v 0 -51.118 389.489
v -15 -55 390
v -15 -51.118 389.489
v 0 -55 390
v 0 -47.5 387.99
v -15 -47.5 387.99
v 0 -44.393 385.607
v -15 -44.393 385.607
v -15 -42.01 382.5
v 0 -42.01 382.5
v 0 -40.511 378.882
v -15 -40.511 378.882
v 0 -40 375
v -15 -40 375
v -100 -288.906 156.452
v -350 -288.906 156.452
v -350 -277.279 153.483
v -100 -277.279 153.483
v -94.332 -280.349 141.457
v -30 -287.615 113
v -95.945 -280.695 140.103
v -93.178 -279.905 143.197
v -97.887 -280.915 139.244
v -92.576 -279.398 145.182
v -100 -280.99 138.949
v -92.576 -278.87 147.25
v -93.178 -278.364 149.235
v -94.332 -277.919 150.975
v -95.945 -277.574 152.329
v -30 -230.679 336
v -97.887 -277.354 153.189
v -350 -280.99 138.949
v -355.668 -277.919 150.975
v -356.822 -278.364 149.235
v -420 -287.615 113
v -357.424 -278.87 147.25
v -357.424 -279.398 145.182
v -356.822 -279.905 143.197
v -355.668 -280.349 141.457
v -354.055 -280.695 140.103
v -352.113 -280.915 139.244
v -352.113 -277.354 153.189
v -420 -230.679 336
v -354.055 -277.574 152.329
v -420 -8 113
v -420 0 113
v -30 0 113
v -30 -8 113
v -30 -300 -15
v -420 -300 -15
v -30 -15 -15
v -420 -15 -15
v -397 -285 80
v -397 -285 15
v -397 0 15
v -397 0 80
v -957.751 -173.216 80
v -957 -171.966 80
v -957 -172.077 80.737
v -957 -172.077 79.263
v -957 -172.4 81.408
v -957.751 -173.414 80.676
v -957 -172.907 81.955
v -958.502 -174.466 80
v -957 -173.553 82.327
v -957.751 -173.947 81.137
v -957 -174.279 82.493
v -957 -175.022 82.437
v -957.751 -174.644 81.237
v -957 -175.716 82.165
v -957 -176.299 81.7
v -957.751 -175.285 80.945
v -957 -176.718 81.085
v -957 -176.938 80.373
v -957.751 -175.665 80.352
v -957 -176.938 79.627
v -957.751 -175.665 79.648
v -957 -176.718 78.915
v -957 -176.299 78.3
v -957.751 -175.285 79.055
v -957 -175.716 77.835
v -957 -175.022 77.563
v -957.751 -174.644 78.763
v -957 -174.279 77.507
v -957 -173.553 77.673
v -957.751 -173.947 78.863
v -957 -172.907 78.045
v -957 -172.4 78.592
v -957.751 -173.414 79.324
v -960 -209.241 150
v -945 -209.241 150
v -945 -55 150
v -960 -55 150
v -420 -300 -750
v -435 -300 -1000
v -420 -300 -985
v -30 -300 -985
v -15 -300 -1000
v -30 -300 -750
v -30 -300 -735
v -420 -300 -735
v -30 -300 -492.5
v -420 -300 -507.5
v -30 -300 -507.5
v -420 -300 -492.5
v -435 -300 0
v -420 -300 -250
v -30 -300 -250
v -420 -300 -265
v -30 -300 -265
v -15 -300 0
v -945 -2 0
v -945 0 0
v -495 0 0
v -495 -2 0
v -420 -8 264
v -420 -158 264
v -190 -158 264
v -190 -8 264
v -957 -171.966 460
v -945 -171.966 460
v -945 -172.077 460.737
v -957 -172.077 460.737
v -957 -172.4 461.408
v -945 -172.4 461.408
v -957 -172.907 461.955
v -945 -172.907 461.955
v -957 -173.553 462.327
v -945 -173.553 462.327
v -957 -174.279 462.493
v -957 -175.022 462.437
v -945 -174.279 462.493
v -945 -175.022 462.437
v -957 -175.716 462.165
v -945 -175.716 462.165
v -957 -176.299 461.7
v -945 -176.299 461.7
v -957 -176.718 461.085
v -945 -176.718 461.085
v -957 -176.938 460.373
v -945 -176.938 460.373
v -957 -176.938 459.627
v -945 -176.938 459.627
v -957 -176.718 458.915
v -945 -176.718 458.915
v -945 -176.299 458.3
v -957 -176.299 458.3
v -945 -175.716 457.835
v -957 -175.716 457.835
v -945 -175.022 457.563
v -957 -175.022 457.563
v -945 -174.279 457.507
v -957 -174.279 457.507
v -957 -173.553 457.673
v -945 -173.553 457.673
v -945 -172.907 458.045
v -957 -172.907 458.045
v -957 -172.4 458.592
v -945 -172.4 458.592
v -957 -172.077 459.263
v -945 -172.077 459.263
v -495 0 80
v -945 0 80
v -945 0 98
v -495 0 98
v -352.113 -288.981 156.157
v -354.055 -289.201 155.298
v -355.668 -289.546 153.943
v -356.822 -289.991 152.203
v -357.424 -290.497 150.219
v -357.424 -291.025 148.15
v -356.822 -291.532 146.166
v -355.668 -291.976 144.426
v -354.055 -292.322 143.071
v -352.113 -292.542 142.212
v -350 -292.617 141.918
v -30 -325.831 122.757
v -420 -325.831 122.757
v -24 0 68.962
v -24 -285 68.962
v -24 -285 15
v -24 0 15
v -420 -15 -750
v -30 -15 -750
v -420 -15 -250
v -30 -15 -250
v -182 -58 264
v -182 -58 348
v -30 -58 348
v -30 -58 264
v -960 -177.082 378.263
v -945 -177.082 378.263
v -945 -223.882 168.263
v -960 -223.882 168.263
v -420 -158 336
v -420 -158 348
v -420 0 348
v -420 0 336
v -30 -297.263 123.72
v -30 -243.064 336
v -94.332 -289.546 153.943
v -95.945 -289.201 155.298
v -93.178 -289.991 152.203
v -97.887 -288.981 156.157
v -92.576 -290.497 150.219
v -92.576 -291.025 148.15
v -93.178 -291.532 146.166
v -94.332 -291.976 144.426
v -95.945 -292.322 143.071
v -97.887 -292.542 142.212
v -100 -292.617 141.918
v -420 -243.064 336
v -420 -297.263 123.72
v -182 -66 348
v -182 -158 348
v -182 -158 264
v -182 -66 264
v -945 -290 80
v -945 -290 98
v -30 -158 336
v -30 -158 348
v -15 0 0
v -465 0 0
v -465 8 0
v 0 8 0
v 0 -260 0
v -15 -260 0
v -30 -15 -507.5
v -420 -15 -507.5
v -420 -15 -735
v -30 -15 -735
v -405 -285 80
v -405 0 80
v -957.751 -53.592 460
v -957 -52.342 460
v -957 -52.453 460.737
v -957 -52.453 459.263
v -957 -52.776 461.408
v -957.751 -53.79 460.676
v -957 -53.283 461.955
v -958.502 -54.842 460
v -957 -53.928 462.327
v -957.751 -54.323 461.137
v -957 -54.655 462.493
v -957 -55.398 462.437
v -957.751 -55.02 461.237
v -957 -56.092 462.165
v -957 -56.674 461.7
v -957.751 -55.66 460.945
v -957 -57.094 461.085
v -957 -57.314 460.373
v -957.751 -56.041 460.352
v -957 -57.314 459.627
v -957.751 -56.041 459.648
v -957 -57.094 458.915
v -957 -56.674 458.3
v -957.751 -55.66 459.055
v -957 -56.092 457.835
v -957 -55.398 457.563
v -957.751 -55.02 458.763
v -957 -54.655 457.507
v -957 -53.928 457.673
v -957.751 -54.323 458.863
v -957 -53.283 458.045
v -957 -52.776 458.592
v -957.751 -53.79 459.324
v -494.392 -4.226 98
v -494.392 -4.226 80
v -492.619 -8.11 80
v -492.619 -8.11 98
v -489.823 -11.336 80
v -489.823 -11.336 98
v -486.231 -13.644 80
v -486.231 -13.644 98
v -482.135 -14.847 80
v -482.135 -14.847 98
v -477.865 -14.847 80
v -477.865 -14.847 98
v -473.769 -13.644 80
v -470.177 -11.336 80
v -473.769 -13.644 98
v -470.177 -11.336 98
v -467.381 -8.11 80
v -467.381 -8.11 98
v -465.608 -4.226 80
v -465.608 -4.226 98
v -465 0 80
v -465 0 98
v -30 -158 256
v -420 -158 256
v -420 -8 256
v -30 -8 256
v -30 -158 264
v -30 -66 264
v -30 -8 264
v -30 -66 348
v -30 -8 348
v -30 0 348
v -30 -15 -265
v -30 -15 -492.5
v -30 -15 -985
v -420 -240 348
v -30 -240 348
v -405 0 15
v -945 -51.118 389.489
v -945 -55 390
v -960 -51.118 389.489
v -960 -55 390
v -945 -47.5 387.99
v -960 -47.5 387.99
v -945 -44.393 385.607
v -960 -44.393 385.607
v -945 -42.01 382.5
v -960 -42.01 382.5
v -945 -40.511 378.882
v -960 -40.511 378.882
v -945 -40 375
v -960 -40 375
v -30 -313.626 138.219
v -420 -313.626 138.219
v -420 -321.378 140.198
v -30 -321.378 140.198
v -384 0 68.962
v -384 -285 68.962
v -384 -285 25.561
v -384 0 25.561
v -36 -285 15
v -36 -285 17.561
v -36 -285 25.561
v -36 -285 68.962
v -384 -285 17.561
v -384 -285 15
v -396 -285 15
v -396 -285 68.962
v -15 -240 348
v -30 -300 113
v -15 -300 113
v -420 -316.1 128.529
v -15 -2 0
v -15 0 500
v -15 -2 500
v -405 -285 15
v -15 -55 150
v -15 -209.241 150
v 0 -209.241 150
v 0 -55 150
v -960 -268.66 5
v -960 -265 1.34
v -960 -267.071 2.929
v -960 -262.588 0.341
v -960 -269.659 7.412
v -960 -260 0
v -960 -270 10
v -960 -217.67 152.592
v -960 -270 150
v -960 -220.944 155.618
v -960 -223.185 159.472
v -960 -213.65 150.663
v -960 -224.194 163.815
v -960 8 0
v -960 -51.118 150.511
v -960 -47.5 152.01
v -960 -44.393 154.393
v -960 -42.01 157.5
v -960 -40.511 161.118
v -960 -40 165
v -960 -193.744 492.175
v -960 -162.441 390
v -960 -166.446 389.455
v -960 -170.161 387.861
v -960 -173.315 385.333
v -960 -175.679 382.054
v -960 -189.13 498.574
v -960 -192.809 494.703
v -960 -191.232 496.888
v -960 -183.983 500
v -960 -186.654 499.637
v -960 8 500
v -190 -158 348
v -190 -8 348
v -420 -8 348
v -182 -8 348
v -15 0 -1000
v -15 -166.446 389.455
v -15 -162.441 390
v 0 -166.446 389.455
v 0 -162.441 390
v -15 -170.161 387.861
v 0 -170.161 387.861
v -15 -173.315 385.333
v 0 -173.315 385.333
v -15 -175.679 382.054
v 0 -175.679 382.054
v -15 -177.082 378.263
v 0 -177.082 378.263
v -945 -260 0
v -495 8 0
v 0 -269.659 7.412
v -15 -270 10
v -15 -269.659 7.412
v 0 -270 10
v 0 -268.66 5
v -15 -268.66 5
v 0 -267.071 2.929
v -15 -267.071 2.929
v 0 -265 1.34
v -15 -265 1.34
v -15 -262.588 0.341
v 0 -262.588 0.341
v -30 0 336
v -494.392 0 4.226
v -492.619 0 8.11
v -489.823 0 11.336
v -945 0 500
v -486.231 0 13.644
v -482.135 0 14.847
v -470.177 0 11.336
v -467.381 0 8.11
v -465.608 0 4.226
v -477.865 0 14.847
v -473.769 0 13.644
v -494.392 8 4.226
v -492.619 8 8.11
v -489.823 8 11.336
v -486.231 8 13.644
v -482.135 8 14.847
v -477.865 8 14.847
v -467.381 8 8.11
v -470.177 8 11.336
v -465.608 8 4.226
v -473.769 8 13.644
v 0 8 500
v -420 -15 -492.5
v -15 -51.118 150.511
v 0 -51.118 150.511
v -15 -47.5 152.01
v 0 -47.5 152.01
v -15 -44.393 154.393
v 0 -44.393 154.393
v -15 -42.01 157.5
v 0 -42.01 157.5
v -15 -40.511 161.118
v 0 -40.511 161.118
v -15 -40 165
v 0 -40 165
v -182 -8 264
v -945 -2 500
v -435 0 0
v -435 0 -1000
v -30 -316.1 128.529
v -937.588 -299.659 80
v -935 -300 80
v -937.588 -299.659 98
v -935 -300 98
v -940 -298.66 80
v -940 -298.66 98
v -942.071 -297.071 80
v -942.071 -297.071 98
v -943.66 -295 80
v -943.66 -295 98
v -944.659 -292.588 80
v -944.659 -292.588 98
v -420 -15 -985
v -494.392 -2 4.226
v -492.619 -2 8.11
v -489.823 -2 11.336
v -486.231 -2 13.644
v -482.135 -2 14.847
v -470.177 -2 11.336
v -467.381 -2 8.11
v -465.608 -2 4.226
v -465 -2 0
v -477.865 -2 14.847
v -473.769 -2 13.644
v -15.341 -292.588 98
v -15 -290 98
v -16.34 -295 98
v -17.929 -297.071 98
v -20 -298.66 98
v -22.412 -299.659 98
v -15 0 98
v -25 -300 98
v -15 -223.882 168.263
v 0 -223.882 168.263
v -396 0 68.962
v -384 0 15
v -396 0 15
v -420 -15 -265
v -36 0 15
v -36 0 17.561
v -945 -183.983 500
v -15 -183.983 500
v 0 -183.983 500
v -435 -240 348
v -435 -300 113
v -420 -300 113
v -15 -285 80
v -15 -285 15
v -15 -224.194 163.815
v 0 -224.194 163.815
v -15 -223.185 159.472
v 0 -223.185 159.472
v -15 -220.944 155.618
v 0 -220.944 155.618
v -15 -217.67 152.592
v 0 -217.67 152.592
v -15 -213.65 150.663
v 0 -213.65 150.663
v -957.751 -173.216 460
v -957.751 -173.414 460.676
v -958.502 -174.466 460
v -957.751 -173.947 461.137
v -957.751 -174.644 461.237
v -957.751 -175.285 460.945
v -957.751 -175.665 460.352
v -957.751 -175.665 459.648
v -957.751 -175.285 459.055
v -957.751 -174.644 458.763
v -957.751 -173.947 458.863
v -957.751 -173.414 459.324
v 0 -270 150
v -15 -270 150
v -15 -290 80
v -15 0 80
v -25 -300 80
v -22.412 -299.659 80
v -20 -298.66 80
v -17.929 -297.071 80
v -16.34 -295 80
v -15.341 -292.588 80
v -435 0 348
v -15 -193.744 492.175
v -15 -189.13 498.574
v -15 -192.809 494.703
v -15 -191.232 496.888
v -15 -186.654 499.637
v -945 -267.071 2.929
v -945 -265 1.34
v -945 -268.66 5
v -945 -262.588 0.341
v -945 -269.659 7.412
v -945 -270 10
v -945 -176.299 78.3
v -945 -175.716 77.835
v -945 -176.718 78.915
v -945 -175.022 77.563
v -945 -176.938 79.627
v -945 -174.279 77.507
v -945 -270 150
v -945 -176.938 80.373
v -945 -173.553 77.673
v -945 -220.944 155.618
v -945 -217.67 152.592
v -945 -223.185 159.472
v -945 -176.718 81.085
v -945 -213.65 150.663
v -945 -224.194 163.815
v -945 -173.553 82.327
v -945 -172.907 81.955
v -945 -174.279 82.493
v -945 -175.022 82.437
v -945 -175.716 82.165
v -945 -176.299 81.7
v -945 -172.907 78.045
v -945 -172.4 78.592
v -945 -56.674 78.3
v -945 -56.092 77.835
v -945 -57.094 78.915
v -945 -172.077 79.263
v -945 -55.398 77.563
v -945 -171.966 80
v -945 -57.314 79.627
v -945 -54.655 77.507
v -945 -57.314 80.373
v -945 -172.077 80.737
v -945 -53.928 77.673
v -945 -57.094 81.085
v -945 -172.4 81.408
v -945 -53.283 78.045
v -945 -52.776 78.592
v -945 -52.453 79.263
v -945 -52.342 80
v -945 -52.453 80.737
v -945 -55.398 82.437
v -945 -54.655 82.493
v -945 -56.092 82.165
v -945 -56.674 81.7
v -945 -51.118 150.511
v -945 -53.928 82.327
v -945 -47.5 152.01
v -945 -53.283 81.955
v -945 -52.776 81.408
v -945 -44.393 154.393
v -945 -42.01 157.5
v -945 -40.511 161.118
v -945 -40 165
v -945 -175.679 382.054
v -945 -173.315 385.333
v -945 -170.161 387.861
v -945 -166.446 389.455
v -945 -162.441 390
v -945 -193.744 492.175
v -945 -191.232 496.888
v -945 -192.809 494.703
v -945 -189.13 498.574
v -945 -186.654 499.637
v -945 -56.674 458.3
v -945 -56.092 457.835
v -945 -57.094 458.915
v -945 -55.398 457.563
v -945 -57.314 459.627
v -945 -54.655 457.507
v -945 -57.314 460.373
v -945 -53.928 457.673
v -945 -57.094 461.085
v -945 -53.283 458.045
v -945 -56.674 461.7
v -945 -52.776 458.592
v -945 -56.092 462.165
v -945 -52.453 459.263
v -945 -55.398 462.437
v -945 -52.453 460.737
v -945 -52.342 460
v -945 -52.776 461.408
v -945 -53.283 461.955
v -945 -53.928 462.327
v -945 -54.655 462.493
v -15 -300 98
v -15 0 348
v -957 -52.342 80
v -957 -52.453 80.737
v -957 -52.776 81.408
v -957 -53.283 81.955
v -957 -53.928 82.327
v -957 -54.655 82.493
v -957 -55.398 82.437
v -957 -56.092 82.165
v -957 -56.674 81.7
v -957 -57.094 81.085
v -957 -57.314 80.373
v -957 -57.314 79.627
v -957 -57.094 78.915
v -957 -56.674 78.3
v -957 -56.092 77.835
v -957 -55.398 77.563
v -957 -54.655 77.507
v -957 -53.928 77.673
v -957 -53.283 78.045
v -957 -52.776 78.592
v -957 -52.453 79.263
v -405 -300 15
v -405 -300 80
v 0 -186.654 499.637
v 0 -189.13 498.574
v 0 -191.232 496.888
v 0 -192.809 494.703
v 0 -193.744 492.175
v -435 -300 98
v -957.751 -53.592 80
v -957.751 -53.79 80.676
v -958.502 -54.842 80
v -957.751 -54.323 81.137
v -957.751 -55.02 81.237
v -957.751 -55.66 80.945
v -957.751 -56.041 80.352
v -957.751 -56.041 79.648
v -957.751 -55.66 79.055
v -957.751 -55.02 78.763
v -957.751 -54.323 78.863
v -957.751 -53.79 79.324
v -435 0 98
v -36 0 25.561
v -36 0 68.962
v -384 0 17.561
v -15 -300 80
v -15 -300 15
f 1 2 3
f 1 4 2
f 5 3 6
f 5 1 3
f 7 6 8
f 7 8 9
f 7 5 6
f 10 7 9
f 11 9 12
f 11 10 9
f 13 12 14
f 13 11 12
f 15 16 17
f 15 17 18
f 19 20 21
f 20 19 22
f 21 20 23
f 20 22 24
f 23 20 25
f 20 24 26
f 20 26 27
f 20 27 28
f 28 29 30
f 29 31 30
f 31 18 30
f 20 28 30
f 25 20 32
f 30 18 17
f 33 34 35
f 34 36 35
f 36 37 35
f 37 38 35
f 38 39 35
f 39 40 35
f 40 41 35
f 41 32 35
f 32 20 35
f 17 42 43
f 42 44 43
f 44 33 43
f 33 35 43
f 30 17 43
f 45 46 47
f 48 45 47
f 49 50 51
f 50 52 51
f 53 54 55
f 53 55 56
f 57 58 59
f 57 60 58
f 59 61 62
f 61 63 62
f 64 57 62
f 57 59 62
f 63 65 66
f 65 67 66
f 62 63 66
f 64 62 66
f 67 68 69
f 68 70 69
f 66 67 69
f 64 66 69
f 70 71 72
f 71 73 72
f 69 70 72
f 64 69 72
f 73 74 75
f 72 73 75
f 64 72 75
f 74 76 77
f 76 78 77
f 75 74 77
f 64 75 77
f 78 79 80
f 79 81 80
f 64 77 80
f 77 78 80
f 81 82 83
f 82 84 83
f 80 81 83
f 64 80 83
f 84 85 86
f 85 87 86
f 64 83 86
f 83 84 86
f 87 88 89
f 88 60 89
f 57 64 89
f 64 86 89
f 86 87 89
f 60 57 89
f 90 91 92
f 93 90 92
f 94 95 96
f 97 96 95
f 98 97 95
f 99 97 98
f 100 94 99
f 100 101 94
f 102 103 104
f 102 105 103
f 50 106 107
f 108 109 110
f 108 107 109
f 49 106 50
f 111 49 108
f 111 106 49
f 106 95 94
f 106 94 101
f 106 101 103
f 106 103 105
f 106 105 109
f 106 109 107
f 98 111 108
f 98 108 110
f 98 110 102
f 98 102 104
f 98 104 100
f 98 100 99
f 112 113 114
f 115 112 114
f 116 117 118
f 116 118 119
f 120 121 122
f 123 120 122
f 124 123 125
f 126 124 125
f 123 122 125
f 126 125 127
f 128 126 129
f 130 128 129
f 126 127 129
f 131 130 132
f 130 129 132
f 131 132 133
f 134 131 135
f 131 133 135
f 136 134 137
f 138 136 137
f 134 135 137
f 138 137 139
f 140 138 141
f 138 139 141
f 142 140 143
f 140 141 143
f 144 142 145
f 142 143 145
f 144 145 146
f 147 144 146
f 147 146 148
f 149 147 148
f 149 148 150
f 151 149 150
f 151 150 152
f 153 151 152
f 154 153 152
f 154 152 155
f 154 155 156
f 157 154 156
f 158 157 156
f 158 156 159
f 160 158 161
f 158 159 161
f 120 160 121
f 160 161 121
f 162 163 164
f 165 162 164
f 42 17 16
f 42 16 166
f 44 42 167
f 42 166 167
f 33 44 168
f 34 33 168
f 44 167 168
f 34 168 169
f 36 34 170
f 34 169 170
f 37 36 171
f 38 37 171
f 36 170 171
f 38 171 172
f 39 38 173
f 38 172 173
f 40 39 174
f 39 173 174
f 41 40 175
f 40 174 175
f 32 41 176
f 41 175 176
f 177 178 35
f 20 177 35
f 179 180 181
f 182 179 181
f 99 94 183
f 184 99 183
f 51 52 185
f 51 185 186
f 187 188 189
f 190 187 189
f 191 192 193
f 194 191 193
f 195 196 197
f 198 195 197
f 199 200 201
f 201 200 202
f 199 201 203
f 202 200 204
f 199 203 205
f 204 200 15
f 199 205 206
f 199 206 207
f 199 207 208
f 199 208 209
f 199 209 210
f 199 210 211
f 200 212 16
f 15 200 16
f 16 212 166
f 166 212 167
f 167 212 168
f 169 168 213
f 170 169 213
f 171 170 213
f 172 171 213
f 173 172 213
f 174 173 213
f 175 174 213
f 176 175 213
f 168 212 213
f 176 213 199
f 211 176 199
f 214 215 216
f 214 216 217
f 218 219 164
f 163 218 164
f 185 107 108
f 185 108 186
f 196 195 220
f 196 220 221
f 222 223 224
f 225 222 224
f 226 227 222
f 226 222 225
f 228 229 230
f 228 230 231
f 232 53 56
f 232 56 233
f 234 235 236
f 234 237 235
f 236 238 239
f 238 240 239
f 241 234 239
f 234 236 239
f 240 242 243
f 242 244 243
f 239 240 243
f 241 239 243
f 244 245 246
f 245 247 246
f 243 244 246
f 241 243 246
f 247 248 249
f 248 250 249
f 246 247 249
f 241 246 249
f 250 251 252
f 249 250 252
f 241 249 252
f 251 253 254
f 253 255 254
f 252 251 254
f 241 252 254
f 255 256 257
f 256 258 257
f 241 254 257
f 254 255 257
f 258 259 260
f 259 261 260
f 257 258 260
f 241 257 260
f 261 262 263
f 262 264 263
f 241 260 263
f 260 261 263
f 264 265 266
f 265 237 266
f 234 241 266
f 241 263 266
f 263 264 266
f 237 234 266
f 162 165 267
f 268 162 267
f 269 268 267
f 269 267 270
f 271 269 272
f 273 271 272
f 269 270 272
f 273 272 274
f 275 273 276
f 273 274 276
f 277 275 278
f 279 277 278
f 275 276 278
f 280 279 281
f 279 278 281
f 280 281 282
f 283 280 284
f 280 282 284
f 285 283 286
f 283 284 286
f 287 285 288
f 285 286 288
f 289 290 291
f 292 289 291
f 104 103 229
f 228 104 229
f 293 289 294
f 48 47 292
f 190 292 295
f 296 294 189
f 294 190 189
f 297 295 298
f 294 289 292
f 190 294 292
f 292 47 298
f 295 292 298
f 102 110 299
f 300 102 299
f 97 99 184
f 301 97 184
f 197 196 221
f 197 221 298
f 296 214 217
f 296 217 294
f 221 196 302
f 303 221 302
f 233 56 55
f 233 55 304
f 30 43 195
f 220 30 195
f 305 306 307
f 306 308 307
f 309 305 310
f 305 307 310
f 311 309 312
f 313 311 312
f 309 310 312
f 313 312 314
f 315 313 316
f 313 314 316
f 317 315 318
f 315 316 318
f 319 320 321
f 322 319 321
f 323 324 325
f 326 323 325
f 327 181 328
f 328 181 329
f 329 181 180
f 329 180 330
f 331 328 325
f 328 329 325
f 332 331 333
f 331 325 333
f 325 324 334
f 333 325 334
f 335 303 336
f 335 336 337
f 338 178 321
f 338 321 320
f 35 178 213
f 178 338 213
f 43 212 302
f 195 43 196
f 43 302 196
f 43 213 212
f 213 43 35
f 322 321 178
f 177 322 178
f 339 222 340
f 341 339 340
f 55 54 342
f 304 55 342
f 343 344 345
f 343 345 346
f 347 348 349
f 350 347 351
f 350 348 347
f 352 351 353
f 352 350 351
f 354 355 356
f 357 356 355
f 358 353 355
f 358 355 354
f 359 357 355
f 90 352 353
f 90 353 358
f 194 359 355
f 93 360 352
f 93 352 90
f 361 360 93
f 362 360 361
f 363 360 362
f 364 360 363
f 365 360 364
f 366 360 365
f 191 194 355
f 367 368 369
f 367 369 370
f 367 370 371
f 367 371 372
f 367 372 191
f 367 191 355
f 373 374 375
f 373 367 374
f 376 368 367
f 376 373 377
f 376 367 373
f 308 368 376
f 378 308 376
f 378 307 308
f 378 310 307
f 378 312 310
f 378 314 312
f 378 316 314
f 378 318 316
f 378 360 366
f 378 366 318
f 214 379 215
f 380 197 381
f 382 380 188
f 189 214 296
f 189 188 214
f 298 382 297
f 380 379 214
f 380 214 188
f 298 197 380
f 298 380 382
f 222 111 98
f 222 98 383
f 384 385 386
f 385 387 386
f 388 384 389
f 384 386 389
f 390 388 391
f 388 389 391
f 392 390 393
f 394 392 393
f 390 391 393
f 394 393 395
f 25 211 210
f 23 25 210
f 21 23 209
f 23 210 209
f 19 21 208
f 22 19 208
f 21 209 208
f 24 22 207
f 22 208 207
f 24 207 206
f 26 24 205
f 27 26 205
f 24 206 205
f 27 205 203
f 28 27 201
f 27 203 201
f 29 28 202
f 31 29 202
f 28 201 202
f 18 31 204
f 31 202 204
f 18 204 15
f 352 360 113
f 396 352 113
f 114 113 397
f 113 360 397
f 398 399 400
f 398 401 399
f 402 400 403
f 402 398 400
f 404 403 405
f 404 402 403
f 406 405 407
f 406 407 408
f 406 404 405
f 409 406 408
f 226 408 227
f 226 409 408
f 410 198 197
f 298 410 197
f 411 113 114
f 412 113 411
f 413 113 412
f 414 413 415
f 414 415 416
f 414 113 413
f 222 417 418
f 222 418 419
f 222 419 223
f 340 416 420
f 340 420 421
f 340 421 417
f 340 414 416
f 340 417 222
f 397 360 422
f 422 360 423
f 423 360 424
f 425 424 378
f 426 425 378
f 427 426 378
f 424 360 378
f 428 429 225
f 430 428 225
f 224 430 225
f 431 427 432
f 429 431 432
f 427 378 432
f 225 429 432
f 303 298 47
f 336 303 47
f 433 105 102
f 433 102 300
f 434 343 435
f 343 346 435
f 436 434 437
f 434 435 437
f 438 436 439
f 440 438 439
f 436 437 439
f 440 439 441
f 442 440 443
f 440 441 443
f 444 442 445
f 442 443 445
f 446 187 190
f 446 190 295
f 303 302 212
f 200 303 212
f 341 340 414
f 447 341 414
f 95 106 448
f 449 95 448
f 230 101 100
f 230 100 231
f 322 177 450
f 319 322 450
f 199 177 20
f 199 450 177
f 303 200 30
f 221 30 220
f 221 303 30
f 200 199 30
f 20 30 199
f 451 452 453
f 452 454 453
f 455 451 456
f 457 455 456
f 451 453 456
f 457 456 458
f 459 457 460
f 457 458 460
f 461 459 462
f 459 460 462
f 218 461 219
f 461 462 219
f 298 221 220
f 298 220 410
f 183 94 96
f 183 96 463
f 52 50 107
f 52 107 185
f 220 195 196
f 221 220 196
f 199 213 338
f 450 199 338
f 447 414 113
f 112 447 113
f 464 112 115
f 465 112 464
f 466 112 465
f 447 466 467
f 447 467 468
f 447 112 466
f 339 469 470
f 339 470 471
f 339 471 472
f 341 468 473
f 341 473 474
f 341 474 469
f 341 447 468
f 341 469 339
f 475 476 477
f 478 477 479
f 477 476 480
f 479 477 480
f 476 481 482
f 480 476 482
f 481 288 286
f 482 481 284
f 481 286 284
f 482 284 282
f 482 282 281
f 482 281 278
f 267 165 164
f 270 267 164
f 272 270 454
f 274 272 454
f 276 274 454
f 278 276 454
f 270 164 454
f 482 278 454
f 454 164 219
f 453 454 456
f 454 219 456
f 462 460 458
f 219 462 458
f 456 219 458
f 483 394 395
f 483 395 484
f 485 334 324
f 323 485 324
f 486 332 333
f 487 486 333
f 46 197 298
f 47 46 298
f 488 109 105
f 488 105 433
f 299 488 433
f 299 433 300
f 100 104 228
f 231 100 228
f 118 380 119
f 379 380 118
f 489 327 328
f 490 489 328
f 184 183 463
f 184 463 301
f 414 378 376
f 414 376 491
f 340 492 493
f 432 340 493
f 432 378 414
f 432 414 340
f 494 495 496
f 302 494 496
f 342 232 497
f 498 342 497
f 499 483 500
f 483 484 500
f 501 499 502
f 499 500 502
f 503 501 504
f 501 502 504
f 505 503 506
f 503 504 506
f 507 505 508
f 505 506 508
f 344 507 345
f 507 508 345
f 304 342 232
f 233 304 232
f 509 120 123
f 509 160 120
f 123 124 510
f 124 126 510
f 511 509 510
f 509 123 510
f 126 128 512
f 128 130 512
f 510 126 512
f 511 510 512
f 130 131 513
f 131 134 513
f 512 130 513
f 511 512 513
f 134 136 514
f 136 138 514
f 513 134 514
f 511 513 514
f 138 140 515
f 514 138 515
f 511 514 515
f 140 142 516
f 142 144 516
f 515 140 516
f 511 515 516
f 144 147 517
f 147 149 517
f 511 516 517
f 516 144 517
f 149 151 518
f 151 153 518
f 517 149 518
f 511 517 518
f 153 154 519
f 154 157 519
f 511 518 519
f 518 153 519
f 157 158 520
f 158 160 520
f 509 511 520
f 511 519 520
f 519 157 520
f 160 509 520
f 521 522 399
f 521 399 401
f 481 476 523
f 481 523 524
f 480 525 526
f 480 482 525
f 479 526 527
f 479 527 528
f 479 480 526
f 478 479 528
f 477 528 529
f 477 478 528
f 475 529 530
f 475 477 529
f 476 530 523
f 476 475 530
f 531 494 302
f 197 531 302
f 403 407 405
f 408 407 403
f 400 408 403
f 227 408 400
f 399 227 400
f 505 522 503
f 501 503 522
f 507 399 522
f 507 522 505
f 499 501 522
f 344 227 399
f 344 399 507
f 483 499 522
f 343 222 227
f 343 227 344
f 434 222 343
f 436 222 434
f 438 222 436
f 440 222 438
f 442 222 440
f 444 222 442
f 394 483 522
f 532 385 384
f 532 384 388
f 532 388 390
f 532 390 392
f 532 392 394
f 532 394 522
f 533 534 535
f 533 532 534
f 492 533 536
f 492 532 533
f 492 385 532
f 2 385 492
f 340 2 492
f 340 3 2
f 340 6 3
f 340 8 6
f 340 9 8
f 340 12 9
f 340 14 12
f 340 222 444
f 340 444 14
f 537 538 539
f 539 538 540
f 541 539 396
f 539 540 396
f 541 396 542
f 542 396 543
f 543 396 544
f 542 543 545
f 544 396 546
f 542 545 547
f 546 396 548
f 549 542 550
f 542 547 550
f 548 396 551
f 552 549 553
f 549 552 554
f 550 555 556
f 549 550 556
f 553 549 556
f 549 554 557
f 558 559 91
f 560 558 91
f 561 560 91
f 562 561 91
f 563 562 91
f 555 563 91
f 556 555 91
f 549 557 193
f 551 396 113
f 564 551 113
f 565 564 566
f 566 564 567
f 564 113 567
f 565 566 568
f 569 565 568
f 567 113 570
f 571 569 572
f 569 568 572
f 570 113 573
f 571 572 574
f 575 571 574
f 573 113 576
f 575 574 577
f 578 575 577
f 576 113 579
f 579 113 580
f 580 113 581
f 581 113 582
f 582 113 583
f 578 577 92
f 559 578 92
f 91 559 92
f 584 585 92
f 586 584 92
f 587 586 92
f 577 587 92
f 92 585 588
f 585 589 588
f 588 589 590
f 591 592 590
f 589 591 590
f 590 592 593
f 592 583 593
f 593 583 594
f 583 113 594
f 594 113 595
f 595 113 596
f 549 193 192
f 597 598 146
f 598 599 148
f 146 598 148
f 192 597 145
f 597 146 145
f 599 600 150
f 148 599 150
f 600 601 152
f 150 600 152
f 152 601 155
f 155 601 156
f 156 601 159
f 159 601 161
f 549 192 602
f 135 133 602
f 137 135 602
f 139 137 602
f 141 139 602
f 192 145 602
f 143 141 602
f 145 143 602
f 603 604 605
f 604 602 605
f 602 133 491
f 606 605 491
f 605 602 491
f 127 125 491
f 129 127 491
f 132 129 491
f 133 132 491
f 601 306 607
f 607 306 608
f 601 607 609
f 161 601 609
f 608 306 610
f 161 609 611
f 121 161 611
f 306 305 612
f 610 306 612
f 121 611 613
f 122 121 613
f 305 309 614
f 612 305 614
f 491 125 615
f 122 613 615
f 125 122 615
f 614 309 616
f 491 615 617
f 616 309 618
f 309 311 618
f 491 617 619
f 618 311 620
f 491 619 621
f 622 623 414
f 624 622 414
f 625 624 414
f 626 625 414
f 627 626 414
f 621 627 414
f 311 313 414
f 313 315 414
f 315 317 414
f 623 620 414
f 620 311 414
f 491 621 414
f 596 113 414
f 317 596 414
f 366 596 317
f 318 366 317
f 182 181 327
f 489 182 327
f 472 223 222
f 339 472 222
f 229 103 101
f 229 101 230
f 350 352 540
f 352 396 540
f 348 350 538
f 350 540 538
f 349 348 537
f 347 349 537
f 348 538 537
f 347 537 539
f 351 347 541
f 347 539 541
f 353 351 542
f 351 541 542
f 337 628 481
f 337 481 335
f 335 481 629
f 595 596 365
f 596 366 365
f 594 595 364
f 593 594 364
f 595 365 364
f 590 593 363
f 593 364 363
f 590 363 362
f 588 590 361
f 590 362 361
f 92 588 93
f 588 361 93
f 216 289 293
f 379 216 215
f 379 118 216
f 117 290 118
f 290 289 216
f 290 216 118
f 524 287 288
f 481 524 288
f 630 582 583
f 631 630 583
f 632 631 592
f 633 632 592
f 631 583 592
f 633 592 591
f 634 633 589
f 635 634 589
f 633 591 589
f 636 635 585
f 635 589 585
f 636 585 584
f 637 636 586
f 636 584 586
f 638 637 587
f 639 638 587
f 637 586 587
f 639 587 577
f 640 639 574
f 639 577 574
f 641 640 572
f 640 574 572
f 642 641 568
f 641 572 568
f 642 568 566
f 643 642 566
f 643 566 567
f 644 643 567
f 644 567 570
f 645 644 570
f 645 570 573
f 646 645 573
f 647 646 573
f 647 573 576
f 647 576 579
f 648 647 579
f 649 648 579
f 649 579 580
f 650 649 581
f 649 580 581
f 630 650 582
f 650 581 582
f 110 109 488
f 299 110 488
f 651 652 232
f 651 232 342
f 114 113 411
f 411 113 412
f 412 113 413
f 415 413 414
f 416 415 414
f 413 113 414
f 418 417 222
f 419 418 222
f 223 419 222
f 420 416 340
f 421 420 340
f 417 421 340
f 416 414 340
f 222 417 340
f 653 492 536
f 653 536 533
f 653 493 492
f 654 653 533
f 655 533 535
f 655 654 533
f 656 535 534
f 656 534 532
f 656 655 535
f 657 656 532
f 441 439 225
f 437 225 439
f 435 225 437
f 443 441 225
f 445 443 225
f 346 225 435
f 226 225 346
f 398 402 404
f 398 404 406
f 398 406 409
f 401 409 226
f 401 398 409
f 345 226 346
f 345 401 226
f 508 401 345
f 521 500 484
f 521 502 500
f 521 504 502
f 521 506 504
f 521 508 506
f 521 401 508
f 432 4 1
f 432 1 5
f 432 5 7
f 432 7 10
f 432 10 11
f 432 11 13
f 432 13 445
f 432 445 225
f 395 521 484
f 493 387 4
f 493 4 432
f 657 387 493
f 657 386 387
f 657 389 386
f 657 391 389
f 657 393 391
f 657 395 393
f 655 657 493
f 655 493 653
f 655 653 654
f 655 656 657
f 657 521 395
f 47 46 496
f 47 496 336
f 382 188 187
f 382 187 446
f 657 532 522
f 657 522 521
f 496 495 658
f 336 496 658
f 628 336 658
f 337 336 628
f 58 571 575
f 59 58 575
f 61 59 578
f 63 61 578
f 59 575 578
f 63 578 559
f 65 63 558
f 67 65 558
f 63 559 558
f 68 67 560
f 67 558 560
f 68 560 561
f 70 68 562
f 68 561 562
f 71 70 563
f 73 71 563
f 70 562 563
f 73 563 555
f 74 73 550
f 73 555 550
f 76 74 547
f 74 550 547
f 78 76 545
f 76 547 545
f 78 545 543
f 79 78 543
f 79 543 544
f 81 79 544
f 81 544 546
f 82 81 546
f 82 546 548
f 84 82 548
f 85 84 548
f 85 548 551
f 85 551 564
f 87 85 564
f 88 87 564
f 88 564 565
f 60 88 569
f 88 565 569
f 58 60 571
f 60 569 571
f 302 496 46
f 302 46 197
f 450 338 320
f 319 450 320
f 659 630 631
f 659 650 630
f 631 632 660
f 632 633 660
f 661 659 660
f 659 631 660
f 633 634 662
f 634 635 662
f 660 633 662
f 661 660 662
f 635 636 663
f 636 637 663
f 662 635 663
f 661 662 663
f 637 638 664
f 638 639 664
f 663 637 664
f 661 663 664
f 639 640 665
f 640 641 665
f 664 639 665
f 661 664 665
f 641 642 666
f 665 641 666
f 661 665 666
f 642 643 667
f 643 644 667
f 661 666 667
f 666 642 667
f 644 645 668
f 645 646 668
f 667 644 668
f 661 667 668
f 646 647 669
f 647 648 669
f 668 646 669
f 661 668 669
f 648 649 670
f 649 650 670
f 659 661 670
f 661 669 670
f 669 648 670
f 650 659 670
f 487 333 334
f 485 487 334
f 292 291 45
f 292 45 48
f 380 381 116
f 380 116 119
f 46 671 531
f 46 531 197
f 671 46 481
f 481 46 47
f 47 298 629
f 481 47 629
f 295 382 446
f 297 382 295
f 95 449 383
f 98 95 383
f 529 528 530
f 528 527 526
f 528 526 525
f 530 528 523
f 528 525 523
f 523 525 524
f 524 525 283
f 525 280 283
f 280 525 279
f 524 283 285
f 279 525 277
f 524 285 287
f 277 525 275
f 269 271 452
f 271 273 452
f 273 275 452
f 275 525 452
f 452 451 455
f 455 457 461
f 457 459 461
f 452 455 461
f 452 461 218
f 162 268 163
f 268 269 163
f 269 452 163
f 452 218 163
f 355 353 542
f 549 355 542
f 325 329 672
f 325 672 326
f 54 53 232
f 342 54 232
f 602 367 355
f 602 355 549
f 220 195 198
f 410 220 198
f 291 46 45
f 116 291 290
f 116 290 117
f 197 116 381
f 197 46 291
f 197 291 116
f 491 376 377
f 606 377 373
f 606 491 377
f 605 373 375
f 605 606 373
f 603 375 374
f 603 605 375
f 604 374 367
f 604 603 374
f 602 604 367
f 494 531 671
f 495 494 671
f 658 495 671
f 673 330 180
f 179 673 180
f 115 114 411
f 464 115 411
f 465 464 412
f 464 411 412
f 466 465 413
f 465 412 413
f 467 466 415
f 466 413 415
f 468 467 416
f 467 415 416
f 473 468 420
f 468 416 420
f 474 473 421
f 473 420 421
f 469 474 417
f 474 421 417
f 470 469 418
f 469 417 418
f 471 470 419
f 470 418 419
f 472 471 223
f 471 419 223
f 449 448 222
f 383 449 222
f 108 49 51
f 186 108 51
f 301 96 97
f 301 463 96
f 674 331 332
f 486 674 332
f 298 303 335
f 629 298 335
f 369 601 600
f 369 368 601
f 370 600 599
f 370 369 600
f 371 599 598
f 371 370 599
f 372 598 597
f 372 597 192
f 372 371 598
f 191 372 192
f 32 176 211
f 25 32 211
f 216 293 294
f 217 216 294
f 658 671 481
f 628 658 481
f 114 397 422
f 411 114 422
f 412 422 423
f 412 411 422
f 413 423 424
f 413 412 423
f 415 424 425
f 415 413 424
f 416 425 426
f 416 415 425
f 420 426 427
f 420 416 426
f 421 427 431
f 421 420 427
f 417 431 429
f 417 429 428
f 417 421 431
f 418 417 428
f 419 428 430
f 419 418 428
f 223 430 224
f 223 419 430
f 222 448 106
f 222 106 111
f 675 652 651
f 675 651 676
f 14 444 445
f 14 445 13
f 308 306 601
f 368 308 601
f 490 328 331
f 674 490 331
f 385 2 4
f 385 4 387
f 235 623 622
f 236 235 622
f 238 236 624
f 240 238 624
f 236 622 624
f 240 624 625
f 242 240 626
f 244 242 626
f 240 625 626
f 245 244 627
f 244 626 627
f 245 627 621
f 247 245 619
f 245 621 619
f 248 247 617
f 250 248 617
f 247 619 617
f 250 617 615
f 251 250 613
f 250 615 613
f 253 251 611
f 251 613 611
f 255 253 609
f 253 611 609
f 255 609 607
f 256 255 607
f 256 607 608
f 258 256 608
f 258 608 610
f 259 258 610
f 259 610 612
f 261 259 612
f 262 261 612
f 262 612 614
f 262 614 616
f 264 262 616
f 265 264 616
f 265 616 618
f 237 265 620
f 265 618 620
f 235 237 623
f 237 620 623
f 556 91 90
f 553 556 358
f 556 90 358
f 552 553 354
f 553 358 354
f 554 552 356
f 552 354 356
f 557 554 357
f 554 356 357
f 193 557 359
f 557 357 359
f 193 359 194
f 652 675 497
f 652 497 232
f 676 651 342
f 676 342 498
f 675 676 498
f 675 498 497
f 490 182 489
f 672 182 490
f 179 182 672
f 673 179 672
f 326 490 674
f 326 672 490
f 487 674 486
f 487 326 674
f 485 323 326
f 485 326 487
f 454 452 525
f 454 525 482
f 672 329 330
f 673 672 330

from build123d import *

# Parameters (mm, degrees)
F0_W           = 15
F0_H           = 500
F1_DEPTH       = 8
F2_DEPTH       = 270
F3_SIZE2       = 78
F3_SIZE        = 350
F3_2_SIZE2     = 78
F3_2_SIZE      = 350
F4_W           = 270
F4_H           = 18
F4_W_2         = 30
F5_DEPTH       = 930
F6_R           = 10
F6_2_R         = 10
F7_W           = 15
F7_H           = 235
F7_H_2         = 15
F7_W_2         = 390
F8_DEPTH       = 300
F9_DEPTH       = 8
F10_SIZE2      = 60
F10_SIZE       = 235
F11_W          = 158
F11_H          = 12
F12_DEPTH      = 390
F13_W          = 250
F13_H          = 15
F14_DEPTH      = 25
F15_DEPTH      = 390
F18_DEPTH      = 15
F19_W          = 348
F19_H          = 8
F20_DEPTH      = 285
F19_W_2        = 8
F19_H_2        = 65
F21_DEPTH      = 285
F22_D          = 5
F22_DEPTH      = 12
F22_TIP        = 1.5021515476
F23_DEPTH      = 25
F23_DEPTH_BACK = 945
F24_R          = 15
F26_DEPTH      = 25
F11_W_2        = 150
F11_H_2        = 8
F28_DEPTH      = 390
F27_W          = 152
F27_H          = 8
F29_DEPTH      = 84
F31_DEPTH      = 2
F32_W          = 420
F32_H          = 300
F33_DEPTH      = 1000
F34_T          = -15
F35_W          = 285
F35_H          = 15
F36_DEPTH      = 390


# Not quite as in the source:
# - a feature names something its author has since deleted; it is built from what else it names


with BuildPart() as f1:
    # F0 (on Front) → F1 (new body)
    with BuildSketch(Plane.XZ):
        with Locations((-952.5, 250)):
            Rectangle(F0_W, F0_H)
        with BuildLine():
            Line((-465, 0), (-15, 0))
            Line((-15, 0), (-15, 500))
            Line((-15, 500), (-945, 500))
            Line((-945, 500), (-945, 0))
            Line((-945, 0), (-495, 0))
            ThreePointArc((-495, 0), (-480, 15), (-465, 0))
        make_face()
        with Locations((-7.5, 250)):
            Rectangle(F0_W, F0_H)
    extrude(amount=-F1_DEPTH)

    # F0 (on Front) → F2 (join)
    with BuildSketch(Plane.XZ):
        with Locations((-952.5, 250)):
            Rectangle(F0_W, F0_H)
        with Locations((-7.5, 250)):
            Rectangle(F0_W, F0_H)
    extrude(amount=F2_DEPTH)

    # F3
    f3_edges = [f1.edges().sort_by_distance(p)[0] for p in [
        (-952.5, -270, 500),
    ]]
    f3_side = f1.faces().sort_by_distance((-952.5, -270, 250))[0]
    chamfer(f3_edges, length=F3_SIZE, length2=F3_SIZE2, reference=f3_side)

    # F3#2
    f3_2_edges = [f1.edges().sort_by_distance(p)[0] for p in [
        (-7.5, -270, 500),
    ]]
    f3_2_side = f1.faces().sort_by_distance((-7.5, -270, 250))[0]
    chamfer(f3_2_edges, length=F3_2_SIZE, length2=F3_2_SIZE2, reference=f3_2_side)

    # F6
    f6_edges = [f1.edges().sort_by_distance(p)[0] for p in [
        (-952.5, -192, 500),
        (-7.5, -192, 500),
        (-7.5, -270, 0),
        (-952.5, -270, 0),
    ]]
    fillet(f6_edges, radius=F6_R)

    # F22 (one way)
    with BuildSketch(Plane.YZ.offset(-945)):
        with Locations((-174.4660586119, 460), (-54.8418462276, 460), (-174.4660586119, 80), (-54.8418462276, 80)):
            Circle(F22_D / 2)
    extrude(amount=-F22_DEPTH, mode=Mode.SUBTRACT)
    with Locations(Plane.YZ.offset(-945)):
        with Locations((-174.4660586119, 460), (-54.8418462276, 460), (-174.4660586119, 80), (-54.8418462276, 80)):
            with Locations((0, 0, -(F22_DEPTH + F22_TIP / 2))):  # 118° drill point
                Cone(0, F22_D / 2, F22_TIP, mode=Mode.SUBTRACT)

    # F4 (on face) → F23 (cut, two sides)
    with BuildSketch(Plane.YZ.offset(-945)) as f23_sk:
        Polygon((-40, 390), (-174.4660586119, 390), (-227.9517728976, 150), (-40, 150), align=None)
    extrude(amount=-F23_DEPTH, mode=Mode.SUBTRACT)
    extrude(f23_sk.sketch, amount=F23_DEPTH_BACK, mode=Mode.SUBTRACT)

    # F24
    f24_edges = [f1.edges().sort_by_distance(p)[0] for p in [
        (-952.5, -40, 150),
        (-952.5, -227.951773, 150),
        (-952.5, -40, 390),
        (-7.5, -227.951773, 150),
        (-7.5, -40, 150),
        (-7.5, -40, 390),
        (-7.5, -174.466059, 390),
        (-952.5, -174.466059, 390),
    ]]
    fillet(f24_edges, radius=F24_R)


with BuildPart() as f5:
    # F4 (on face) → F5 (new body, through all)
    with BuildSketch(Plane.YZ.offset(-945)):
        with Locations((-135, 89)):
            Rectangle(F4_W, F4_H)
        with Locations((-285, 89)):
            Rectangle(F4_W_2, F4_H)
    extrude(amount=F5_DEPTH)

    # F6#2
    f6_2_edges = [f5.edges().sort_by_distance(p)[0] for p in [
        (-945, -300, 89),
        (-15, -300, 89),
    ]]
    fillet(f6_2_edges, radius=F6_2_R)

    # F25 (on face) → F26 (cut)
    with BuildSketch(Plane.XY.offset(98)):
        with BuildLine():
            Line((-495, 0), (-465, 0))
            ThreePointArc((-465, 0), (-480, 15), (-495, 0))
        make_face()
        with BuildLine():
            ThreePointArc((-495, 0), (-480, -15), (-465, 0))
            Line((-465, 0), (-495, 0))
        make_face()
    extrude(amount=-F26_DEPTH, mode=Mode.SUBTRACT)


with BuildPart() as f8:
    # F7 (on Front) → F8 (new body)
    with BuildSketch(Plane.XZ):
        with Locations((-427.5, 230.5)):
            Rectangle(F7_W, F7_H)
        with Locations((-427.5, 105.5)):
            Rectangle(F7_W, F7_H_2)
        with Locations((-22.5, 230.5)):
            Rectangle(F7_W, F7_H)
        with Locations((-22.5, 105.5)):
            Rectangle(F7_W, F7_H_2)
        with Locations((-225, 105.5)):
            Rectangle(F7_W_2, F7_H_2)
    extrude(amount=F8_DEPTH)

    # F10
    f10_edges = [f8.edges().sort_by_distance(p)[0] for p in [
        (-427.5, -300, 348),
        (-22.5, -300, 348),
    ]]
    f10_side = f8.faces().sort_by_distance((-427.5, -300, 343.11226))[0]
    chamfer(f10_edges, length=F10_SIZE, length2=F10_SIZE2, reference=f10_side)


with BuildPart() as f9:
    # F7 (on Front) → F9 (new body)
    with BuildSketch(Plane.XZ):
        with Locations((-225, 230.5)):
            Rectangle(F7_W_2, F7_H)
    extrude(amount=F9_DEPTH)

    # F11 (on face) → F28 (join, through all)
    with BuildSketch(Plane.YZ.offset(-420)):
        with Locations((-83, 260)):
            Rectangle(F11_W_2, F11_H_2)
    extrude(amount=F28_DEPTH)

    # F27 (on face) → F29 (join, through all)
    with BuildSketch(Plane.XY.offset(348)):
        Polygon((-182, -8), (-190, -8), (-190, -158), (-182, -158), (-182, -66), (-182, -58), align=None)
        with Locations((-106, -62)):
            Rectangle(F27_W, F27_H)
    extrude(amount=-F29_DEPTH)


with BuildPart() as f12:
    # F11 (on face) → F12 (new body, through all)
    with BuildSketch(Plane.YZ.offset(-420)):
        with Locations((-79, 342)):
            Rectangle(F11_W, F11_H)
        Polygon((-227.6150473168, 348), (-240, 348), (-243.0638297872, 336), (-230.678877104, 336), align=None)
        Polygon((-230.678877104, 336), (-243.0638297872, 336), (-297.2629938822, 123.7199406282), (-299.2420598443, 115.9685989432), (-287.6150473168, 113), align=None)
        Polygon((-299.2420598443, 115.9685989432), (-297.2629938822, 123.7199406282), (-316.1001179345, 128.5294191096), (-313.6262854818, 138.2185962159), (-321.3776271668, 140.197662178), (-325.8305255816, 122.7571433868), align=None)
        Polygon((-158, 348), (-227.6150473168, 348), (-230.678877104, 336), (-158, 336), align=None)
    extrude(amount=F12_DEPTH)

    # F13 (on face) → F14 (cut)
    with BuildSketch(Plane(origin=(0, -308.725881853, 78.8236294093), x_dir=(1, 0, 0), z_dir=(0, -0.9689177106, 0.2473832453))):
        with Locations((-225, 72.618143931)):
            Rectangle(F13_W, F13_H)
        with BuildLine():
            Line((-350, 65.118143931), (-350, 80.118143931))
            ThreePointArc((-350, 80.118143931), (-357.5, 72.618143931), (-350, 65.118143931))
        make_face()
        with BuildLine():
            ThreePointArc((-100, 65.118143931), (-92.5, 72.618143931), (-100, 80.118143931))
            Line((-100, 80.118143931), (-100, 65.118143931))
        make_face()
    extrude(amount=-F14_DEPTH, mode=Mode.SUBTRACT)


with BuildPart() as f15:
    # F11 (on face) → F15 (new body, through all)
    with BuildSketch(Plane.YZ.offset(-420)):
        with Locations((-79, 342)):
            Rectangle(F11_W, F11_H)
    extrude(amount=F15_DEPTH)


with BuildPart() as f12_1:
    add(f12.part)

    # F16: cut F15
    add(f15.part, mode=Mode.SUBTRACT)


with BuildPart() as f18:
    # F17 (on face) → F18 (new body)
    with BuildSketch(Plane.XZ.offset(300)):
        Polygon((-15, 15), (-15, 80), (-25, 80), (-405, 80), (-405, 15), align=None)
    extrude(amount=-F18_DEPTH)


with BuildPart() as f20:
    # F19 (on face) → F20 (new body, through all)
    with BuildSketch(Plane(origin=(0, -285, 0), x_dir=(-1, 0, 0), z_dir=(0, 1, 0))):
        Polygon((24, 68.9618736506), (24, 15), (36, 15), (36, 17.5610594451), (36, 25.5610594451), (36, 68.9618736506), align=None)
        with Locations((210, 21.5610594451)):
            Rectangle(F19_W, F19_H)
        Polygon((384, 17.5610594451), (384, 15), (396, 15), (396, 68.9618736506), (384, 68.9618736506), (384, 25.5610594451), align=None)
    extrude(amount=F20_DEPTH)


with BuildPart() as f21:
    # F19 (on face) → F21 (new body, through all)
    with BuildSketch(Plane(origin=(0, -285, 0), x_dir=(-1, 0, 0), z_dir=(0, 1, 0))):
        with Locations((401, 47.5)):
            Rectangle(F19_W_2, F19_H_2)
    extrude(amount=F21_DEPTH)


with BuildPart() as f31:
    # F30 (on face) → F31 (new body)
    with BuildSketch(Plane.XZ):
        with BuildLine():
            Line((-15, 500), (-945, 500))
            Line((-945, 500), (-945, 0))
            Line((-945, 0), (-495, 0))
            ThreePointArc((-495, 0), (-480, 15), (-465, 0))
            Line((-465, 0), (-15, 0))
            Line((-15, 0), (-15, 500))
        make_face()
    extrude(amount=F31_DEPTH)


with BuildPart() as f33:
    # F32 (on Top) → F33 (new body)
    with BuildSketch(Plane.XY):
        with Locations((-225, -150)):
            Rectangle(F32_W, F32_H)
    extrude(amount=-F33_DEPTH)

    # F34
    f34_openings = [f33.faces().sort_by_distance(p)[0] for p in [
        (-225, -300, -500),
    ]]
    offset(amount=F34_T, openings=f34_openings)

    # F35 (on face) → F36 (join, through all)
    with BuildSketch(Plane.YZ.offset(-420)):
        with Locations((-157.5, -257.5)):
            Rectangle(F35_W, F35_H)
        with Locations((-157.5, -500)):
            Rectangle(F35_W, F35_H)
        with Locations((-157.5, -742.5)):
            Rectangle(F35_W, F35_H)
    extrude(amount=F36_DEPTH)


solid = Compound([f1.part, f5.part, f8.part, f9.part, f15.part, f12_1.part, f18.part, f20.part, f21.part, f31.part, f33.part])
